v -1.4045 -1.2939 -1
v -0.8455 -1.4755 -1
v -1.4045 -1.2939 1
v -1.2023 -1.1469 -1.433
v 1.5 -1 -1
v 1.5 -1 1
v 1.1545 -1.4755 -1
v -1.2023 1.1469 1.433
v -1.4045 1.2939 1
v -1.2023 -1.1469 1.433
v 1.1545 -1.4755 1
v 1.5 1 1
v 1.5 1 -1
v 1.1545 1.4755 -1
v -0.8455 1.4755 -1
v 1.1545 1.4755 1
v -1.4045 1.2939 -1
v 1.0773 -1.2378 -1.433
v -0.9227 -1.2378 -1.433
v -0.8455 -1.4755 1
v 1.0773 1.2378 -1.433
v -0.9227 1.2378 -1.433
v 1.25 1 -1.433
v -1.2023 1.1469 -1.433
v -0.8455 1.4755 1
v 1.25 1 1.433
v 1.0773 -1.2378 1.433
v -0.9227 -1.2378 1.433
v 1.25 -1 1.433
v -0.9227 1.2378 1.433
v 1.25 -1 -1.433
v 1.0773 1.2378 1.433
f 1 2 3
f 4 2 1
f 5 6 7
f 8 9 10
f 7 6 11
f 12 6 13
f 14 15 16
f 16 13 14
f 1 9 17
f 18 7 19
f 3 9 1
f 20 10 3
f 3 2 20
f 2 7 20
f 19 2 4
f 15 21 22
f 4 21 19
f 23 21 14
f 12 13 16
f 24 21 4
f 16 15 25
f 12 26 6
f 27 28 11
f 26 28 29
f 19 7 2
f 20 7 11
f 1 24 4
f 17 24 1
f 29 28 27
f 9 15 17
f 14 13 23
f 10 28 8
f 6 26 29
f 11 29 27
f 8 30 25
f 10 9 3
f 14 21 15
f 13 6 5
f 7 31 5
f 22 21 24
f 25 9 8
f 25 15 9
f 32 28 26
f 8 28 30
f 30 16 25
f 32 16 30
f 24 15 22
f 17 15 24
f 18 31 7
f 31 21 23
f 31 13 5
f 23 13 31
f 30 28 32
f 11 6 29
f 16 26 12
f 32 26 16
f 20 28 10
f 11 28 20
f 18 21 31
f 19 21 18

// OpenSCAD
// Exact offset of a box by a ball. Renders, but the patch seams show as
// hairlines: the plates, edge cylinders and corner octants do not share
// topology, so the display mesh has hairline cracks (128 open edges here).
minkowski() {
  cube([2, 2, 2], center = true);
  sphere(0.5);
}
